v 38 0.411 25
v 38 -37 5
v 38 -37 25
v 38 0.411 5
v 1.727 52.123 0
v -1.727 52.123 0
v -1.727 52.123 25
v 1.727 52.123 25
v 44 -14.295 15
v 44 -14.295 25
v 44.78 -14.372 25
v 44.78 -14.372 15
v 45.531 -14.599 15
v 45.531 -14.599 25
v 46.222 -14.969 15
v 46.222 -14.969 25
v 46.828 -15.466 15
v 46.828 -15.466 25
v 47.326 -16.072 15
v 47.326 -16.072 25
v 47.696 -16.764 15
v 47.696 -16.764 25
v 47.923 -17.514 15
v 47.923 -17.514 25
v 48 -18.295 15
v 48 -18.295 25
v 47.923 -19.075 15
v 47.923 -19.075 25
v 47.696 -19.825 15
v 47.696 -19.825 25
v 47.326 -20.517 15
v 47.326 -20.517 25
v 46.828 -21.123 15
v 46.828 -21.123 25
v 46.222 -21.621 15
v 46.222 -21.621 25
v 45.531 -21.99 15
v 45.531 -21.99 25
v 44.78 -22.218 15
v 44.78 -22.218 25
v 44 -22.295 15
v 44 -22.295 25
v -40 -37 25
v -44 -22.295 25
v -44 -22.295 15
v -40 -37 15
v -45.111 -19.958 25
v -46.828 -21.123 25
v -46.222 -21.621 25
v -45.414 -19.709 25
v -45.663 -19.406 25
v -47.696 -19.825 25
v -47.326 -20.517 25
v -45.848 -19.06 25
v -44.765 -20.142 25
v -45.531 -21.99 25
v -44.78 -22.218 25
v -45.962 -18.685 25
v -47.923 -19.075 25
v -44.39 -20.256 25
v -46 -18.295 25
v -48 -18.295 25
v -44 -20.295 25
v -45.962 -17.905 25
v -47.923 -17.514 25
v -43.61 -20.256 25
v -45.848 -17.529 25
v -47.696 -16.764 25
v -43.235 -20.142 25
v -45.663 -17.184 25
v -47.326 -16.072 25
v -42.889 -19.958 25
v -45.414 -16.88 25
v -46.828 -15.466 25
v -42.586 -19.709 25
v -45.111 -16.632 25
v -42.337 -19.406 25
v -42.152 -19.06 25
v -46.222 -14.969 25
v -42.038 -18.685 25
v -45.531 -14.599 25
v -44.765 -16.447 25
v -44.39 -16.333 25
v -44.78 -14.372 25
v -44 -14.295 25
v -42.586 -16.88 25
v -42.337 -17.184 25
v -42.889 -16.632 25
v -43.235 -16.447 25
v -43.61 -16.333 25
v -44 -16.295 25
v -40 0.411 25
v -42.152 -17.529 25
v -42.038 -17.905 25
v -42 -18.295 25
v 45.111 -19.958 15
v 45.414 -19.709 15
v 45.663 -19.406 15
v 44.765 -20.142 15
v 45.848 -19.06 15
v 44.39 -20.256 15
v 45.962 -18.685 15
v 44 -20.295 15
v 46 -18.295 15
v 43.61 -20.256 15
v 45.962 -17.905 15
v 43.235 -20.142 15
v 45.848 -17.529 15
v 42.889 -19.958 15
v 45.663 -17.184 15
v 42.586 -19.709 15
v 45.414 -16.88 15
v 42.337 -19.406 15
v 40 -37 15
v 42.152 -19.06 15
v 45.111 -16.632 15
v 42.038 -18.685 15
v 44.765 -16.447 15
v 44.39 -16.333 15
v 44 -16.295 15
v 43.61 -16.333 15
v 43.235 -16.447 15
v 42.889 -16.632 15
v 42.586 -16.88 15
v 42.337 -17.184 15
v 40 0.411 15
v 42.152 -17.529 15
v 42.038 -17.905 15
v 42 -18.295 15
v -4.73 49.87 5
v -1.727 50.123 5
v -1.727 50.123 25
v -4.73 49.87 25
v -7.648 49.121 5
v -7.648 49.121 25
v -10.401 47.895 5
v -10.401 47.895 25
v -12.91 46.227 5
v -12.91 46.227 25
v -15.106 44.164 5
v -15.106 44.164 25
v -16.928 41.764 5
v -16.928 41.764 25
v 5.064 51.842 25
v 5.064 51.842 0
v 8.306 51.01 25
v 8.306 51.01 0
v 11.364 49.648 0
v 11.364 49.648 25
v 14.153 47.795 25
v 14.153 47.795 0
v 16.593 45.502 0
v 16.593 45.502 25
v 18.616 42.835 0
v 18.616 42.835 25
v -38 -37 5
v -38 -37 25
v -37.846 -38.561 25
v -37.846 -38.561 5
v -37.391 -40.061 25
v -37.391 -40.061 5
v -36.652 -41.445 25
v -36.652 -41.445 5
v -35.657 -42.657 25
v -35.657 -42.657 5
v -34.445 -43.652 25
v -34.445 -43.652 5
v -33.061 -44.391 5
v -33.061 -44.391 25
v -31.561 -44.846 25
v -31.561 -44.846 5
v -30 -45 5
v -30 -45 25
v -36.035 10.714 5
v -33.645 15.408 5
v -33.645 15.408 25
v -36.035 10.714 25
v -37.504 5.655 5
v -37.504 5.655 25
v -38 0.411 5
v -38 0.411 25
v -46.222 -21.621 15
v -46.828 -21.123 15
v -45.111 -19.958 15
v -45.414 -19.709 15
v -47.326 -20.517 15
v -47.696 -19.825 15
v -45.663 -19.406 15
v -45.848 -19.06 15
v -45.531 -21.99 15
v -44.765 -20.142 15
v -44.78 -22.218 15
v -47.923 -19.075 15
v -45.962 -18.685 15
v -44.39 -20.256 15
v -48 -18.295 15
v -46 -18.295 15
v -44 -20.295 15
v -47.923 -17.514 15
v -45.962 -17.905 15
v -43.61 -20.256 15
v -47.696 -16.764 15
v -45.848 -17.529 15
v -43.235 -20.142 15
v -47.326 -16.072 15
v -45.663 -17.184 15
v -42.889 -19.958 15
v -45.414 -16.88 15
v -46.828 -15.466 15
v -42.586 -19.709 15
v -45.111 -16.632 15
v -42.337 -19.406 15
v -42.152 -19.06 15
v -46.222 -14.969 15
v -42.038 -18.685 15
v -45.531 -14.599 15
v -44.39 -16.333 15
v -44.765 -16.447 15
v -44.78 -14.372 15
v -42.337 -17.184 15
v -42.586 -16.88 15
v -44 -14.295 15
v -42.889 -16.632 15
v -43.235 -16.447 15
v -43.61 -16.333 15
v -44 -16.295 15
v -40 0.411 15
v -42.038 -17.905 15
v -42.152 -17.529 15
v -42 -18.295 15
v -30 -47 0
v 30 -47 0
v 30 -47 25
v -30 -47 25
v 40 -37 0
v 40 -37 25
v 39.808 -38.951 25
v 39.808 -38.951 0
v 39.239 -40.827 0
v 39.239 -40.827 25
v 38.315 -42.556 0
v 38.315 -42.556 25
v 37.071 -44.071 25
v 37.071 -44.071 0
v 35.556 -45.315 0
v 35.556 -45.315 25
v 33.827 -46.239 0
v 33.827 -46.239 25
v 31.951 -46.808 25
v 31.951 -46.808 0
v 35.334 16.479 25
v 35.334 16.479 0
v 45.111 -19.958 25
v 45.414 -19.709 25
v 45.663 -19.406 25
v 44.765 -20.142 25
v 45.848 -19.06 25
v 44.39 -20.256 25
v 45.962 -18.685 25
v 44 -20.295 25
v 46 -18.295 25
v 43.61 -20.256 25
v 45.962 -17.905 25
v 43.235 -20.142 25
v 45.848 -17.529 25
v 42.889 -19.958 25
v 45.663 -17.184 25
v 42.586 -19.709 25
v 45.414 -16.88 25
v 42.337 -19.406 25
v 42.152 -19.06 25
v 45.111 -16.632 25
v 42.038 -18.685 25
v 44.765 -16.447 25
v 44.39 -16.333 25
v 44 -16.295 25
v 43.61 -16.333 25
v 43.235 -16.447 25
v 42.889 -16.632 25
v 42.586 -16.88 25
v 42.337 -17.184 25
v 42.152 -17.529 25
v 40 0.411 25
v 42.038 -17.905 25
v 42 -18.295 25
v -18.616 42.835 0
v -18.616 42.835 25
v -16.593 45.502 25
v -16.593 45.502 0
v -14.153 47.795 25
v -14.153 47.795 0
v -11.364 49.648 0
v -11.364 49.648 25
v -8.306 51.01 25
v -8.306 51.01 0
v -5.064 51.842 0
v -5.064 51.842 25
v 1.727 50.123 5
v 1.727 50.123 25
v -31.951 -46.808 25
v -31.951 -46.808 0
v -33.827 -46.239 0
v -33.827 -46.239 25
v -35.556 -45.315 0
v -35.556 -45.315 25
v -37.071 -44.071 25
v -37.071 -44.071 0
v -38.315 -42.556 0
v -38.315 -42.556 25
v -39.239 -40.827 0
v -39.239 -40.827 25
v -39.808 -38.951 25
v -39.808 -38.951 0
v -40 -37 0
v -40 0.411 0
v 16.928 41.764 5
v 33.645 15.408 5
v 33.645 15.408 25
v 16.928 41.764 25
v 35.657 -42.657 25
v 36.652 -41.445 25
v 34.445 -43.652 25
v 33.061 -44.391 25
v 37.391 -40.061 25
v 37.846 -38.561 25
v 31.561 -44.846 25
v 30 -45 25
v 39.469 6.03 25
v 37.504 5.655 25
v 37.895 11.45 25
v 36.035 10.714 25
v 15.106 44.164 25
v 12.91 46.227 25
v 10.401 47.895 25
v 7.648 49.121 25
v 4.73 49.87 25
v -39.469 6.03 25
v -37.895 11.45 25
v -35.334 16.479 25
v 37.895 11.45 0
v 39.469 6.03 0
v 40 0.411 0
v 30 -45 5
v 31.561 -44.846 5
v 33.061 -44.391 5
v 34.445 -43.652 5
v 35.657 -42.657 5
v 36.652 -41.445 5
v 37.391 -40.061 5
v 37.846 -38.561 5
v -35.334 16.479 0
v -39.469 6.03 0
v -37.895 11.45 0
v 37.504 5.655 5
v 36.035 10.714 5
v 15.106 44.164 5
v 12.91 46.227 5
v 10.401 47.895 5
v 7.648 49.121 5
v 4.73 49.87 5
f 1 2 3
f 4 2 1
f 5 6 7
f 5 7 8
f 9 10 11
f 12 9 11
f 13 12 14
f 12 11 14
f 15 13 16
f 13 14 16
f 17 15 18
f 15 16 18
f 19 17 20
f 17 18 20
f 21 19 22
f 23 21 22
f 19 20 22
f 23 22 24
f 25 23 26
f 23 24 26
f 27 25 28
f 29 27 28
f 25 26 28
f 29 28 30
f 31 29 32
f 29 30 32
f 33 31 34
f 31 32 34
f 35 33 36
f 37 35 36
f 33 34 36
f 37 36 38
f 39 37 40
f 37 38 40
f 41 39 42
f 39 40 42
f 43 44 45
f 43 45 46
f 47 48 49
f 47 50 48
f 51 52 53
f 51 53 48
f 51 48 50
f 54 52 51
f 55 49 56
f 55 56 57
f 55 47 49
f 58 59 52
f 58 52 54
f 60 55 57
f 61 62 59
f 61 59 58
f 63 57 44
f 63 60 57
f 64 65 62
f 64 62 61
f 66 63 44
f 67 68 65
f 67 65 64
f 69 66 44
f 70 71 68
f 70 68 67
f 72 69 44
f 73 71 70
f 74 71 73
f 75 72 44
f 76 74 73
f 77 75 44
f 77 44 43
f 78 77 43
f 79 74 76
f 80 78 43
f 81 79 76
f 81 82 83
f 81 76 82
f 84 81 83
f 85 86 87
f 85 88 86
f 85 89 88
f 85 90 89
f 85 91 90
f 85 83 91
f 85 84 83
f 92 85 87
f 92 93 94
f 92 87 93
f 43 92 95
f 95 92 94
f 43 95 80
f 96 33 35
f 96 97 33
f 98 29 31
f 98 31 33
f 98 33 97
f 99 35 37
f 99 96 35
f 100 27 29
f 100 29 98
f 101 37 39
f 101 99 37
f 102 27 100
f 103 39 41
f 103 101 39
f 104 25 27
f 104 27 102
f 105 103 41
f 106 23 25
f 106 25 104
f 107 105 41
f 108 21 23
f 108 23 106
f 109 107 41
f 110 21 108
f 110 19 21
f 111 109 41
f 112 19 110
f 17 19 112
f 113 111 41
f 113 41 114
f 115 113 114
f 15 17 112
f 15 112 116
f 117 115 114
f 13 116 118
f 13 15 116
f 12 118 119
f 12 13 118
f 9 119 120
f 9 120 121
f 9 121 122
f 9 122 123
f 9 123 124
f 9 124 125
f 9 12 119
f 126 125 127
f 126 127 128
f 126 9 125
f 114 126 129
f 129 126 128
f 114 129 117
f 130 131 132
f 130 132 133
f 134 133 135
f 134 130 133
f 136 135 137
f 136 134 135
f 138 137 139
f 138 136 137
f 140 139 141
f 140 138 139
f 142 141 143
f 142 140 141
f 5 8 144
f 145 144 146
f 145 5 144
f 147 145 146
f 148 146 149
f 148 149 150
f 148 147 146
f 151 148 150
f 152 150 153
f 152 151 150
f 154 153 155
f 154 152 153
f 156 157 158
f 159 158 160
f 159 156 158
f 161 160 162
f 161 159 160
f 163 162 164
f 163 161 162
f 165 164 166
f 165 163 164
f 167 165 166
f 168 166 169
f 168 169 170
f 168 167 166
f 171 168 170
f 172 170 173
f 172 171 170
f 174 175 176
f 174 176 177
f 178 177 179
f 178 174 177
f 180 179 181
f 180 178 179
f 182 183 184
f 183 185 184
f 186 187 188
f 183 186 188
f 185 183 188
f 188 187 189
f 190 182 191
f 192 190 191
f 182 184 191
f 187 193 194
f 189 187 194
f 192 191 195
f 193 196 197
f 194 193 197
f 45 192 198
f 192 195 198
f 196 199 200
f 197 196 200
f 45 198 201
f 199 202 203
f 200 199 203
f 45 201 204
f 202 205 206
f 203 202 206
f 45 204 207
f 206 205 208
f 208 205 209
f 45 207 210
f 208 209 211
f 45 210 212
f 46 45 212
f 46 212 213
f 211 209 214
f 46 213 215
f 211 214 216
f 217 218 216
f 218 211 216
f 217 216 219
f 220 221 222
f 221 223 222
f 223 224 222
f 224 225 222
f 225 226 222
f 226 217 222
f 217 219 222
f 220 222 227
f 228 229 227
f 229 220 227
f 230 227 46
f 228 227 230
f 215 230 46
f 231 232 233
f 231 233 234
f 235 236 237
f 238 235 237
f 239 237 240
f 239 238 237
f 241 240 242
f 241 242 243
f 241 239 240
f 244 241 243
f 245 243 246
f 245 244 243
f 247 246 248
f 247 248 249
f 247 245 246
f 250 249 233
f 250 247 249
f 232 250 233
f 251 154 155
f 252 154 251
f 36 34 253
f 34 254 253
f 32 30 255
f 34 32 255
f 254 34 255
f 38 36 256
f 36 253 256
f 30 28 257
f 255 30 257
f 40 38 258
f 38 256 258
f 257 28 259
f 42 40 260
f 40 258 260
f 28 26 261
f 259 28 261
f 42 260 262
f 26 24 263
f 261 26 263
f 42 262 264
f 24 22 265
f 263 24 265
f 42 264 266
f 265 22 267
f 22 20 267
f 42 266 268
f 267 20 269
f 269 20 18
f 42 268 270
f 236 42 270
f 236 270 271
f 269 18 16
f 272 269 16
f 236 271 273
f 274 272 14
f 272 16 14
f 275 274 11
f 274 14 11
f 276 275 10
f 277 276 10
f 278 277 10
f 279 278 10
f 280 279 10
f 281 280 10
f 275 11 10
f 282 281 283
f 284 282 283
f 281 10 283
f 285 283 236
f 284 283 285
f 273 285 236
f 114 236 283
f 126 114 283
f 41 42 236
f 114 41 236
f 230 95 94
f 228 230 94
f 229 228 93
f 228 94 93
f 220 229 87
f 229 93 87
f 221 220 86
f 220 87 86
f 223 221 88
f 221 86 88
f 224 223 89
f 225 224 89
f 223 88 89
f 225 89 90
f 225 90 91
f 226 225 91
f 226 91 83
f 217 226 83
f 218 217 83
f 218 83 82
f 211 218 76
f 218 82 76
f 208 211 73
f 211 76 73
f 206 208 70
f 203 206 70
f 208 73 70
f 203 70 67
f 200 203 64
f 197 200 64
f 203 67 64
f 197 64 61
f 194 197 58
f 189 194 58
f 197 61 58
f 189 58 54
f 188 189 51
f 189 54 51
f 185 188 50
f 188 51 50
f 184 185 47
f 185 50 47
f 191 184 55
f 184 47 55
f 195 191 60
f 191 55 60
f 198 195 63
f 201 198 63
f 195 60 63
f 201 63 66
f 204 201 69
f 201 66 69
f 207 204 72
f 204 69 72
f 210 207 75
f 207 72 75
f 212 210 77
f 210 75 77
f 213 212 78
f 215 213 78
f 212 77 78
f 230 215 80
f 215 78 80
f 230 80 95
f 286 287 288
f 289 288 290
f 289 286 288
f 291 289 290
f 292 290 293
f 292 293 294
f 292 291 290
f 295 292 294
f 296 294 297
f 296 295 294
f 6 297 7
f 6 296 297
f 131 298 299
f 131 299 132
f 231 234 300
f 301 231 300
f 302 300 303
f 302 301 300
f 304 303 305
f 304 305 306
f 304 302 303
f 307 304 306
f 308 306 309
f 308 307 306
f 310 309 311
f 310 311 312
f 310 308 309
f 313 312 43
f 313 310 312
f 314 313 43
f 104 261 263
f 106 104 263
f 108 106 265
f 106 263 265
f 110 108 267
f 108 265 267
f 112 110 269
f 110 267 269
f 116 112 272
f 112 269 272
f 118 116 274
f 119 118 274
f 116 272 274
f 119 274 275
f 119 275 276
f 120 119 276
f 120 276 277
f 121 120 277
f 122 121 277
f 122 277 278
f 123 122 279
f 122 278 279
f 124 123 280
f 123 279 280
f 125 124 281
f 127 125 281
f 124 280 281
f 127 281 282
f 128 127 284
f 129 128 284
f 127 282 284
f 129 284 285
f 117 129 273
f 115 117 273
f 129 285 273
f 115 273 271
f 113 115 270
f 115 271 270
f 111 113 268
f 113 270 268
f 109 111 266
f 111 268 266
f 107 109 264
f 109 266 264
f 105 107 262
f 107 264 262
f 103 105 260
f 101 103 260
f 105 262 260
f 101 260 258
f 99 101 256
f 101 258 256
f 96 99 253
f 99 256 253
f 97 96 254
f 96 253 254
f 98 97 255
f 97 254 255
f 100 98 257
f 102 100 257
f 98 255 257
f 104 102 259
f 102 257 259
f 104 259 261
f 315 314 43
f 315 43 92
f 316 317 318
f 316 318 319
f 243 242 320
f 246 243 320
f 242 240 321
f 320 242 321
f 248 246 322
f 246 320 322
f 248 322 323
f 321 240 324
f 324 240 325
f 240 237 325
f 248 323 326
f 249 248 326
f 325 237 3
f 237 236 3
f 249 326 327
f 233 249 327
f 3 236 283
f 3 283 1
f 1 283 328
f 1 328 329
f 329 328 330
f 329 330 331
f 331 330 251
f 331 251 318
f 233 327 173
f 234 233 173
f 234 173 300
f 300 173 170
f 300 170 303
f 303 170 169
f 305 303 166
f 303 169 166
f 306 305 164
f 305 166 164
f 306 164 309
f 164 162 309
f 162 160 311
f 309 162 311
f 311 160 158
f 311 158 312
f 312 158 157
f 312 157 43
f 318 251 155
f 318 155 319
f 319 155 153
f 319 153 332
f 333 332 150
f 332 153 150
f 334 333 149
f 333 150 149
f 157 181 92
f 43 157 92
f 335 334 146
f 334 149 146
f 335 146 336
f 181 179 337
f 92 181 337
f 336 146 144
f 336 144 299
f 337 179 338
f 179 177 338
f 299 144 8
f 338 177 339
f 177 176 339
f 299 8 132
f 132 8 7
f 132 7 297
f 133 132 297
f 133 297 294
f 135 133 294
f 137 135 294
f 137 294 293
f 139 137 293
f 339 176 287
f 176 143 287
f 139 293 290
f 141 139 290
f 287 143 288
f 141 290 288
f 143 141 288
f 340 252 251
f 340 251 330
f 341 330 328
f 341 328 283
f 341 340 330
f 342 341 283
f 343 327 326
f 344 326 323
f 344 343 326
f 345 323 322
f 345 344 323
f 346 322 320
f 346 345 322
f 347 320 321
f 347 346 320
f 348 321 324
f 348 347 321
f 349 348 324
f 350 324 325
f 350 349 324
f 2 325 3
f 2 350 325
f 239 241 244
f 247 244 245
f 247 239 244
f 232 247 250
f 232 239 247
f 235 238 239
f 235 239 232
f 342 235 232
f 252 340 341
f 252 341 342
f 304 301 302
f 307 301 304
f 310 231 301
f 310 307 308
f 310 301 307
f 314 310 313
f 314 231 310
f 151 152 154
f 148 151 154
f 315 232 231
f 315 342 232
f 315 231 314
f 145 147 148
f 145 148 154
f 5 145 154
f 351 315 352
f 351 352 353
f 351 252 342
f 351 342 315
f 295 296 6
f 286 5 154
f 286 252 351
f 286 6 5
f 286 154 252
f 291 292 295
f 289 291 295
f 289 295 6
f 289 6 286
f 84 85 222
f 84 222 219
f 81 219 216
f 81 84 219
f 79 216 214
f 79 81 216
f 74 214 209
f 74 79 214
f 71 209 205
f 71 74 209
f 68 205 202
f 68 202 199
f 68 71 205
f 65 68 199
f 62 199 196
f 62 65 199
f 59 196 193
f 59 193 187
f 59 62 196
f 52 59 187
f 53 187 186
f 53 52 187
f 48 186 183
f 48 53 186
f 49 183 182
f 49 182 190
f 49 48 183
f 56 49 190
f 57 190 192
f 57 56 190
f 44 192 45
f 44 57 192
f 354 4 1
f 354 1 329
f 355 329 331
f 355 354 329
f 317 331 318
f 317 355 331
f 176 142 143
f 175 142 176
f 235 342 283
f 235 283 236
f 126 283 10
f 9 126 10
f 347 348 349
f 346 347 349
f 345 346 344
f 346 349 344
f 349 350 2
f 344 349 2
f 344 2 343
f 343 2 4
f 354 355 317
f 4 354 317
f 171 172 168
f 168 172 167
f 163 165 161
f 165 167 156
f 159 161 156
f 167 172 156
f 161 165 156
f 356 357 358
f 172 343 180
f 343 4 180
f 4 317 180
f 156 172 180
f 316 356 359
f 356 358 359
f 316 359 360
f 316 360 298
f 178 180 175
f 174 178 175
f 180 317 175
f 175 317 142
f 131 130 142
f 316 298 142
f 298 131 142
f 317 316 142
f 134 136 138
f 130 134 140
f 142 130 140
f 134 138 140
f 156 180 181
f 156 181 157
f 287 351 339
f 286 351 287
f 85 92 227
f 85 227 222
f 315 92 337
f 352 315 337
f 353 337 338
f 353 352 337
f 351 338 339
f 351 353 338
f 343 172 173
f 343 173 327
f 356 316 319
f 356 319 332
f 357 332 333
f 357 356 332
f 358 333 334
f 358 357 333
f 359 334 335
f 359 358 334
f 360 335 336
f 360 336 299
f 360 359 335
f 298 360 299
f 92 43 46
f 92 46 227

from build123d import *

# Parameters (mm, degrees)
BOSS_EXTRUDE4_DEPTH   = 25
SKETCH4_R             = 2
BOSS_EXTRUDE5_DEPTH   = 10
BOSS_EXTRUDE5_2_DEPTH = 10
BOSS_EXTRUDE7_DEPTH   = 5


with BuildPart() as part:
    # Sketch2 → Boss-Extrude4 (new body)
    with BuildSketch(Plane.XY):
        with BuildLine():
            Line((-40, -37), (-40, 0.410620311))
            ThreePointArc((-40, 0.410620311), (-38.809792049, 8.77697448), (-35.333607862, 16.479481898))
            Line((-35.333607862, 16.479481898), (-18.616441267, 42.83518487))
            ThreePointArc((-18.616441267, 42.83518487), (-11.364498397, 49.647613871), (-1.727369359, 52.122610479))
            Line((-1.727369359, 52.122610479), (0, 52.122610479))
            Line((0, 52.122610479), (1.727369359, 52.122610479))
            ThreePointArc((1.727369359, 52.122610479), (11.364498397, 49.647613871), (18.616441267, 42.83518487))
            Line((18.616441267, 42.83518487), (35.333607862, 16.479481898))
            ThreePointArc((35.333607862, 16.479481898), (38.809792049, 8.77697448), (40, 0.410620311))
            Line((40, 0.410620311), (40, -37))
            ThreePointArc((40, -37), (37.071067812, -44.071067812), (30, -47))
            Line((30, -47), (0, -47))
            Line((0, -47), (-30, -47))
            ThreePointArc((-30, -47), (-37.071067812, -44.071067812), (-40, -37))
        make_face()
        with BuildLine():
            Line((0, 50.122610479), (-1.727369359, 50.122610479))
            ThreePointArc((-1.727369359, 50.122610479), (-10.400785493, 47.895113532), (-16.927534076, 41.763927431))
            Line((-16.927534076, 41.763927431), (-33.644700671, 15.408224459))
            ThreePointArc((-33.644700671, 15.408224459), (-36.889139246, 8.219217535), (-38, 0.410620311))
            Line((-38, 0.410620311), (-38, -37))
            ThreePointArc((-38, -37), (-35.656854249, -42.656854249), (-30, -45))
            Line((-30, -45), (0, -45))
            Line((0, -45), (30, -45))
            ThreePointArc((30, -45), (35.656854249, -42.656854249), (38, -37))
            Line((38, -37), (38, 0.410620311))
            ThreePointArc((38, 0.410620311), (36.889139246, 8.219217535), (33.644700671, 15.408224459))
            Line((33.644700671, 15.408224459), (16.927534076, 41.763927431))
            ThreePointArc((16.927534076, 41.763927431), (10.400785493, 47.895113532), (1.727369359, 50.122610479))
            Line((1.727369359, 50.122610479), (0, 50.122610479))
        make_face(mode=Mode.SUBTRACT)
    extrude(amount=BOSS_EXTRUDE4_DEPTH)

    # Sketch6 → Boss-Extrude7 (add)
    with BuildSketch(Plane(origin=(0, 0, 0), x_dir=(-1, 0, 0), z_dir=(0, 0, -1))):
        with BuildLine():
            Line((1.727369359, 52.122610479), (-1.727369359, 52.122610479))
            ThreePointArc((-1.727369359, 52.122610479), (-11.364498397, 49.647613871), (-18.616441267, 42.83518487))
            Line((-18.616441267, 42.83518487), (-35.333607862, 16.479481898))
            ThreePointArc((-35.333607862, 16.479481898), (-38.809792049, 8.77697448), (-40, 0.410620311))
            Line((-40, 0.410620311), (-40, -37))
            ThreePointArc((-40, -37), (-37.071067812, -44.071067812), (-30, -47))
            Line((-30, -47), (30, -47))
            ThreePointArc((30, -47), (37.071067812, -44.071067812), (40, -37))
            Line((40, -37), (40, 0.410620311))
            ThreePointArc((40, 0.410620311), (38.809792049, 8.77697448), (35.333607862, 16.479481898))
            Line((35.333607862, 16.479481898), (18.616441267, 42.83518487))
            ThreePointArc((18.616441267, 42.83518487), (11.364498397, 49.647613871), (1.727369359, 52.122610479))
        make_face()
    extrude(amount=-BOSS_EXTRUDE7_DEPTH)


with BuildPart() as body_2:
    # Sketch4 → Boss-Extrude5 (new body)
    with BuildSketch(Plane.XY.offset(25)):
        with BuildLine():
            Line((40, 0.410620311), (44, -14.294689844))
            ThreePointArc((44, -14.294689844), (48, -18.294689844), (44, -22.294689844))
            Line((44, -22.294689844), (40, -37))
            Line((40, -37), (40, 0.410620311))
        make_face()
        with Locations((44, -18.294689844)):
            Circle(SKETCH4_R, mode=Mode.SUBTRACT)
    extrude(amount=-BOSS_EXTRUDE5_DEPTH)


with BuildPart() as body_3:
    # Sketch4 → Boss-Extrude5 2 (new body)
    with BuildSketch(Plane.XY.offset(25)):
        with BuildLine():
            Line((-40, 0.410620311), (-44, -14.294689844))
            ThreePointArc((-44, -14.294689844), (-48, -18.294689844), (-44, -22.294689844))
            Line((-44, -22.294689844), (-40, -37))
            Line((-40, -37), (-40, 0.410620311))
        make_face()
        with Locations((-44, -18.294689844)):
            Circle(SKETCH4_R, mode=Mode.SUBTRACT)
    extrude(amount=-BOSS_EXTRUDE5_2_DEPTH)


solid = Compound([part.part, body_2.part, body_3.part])
